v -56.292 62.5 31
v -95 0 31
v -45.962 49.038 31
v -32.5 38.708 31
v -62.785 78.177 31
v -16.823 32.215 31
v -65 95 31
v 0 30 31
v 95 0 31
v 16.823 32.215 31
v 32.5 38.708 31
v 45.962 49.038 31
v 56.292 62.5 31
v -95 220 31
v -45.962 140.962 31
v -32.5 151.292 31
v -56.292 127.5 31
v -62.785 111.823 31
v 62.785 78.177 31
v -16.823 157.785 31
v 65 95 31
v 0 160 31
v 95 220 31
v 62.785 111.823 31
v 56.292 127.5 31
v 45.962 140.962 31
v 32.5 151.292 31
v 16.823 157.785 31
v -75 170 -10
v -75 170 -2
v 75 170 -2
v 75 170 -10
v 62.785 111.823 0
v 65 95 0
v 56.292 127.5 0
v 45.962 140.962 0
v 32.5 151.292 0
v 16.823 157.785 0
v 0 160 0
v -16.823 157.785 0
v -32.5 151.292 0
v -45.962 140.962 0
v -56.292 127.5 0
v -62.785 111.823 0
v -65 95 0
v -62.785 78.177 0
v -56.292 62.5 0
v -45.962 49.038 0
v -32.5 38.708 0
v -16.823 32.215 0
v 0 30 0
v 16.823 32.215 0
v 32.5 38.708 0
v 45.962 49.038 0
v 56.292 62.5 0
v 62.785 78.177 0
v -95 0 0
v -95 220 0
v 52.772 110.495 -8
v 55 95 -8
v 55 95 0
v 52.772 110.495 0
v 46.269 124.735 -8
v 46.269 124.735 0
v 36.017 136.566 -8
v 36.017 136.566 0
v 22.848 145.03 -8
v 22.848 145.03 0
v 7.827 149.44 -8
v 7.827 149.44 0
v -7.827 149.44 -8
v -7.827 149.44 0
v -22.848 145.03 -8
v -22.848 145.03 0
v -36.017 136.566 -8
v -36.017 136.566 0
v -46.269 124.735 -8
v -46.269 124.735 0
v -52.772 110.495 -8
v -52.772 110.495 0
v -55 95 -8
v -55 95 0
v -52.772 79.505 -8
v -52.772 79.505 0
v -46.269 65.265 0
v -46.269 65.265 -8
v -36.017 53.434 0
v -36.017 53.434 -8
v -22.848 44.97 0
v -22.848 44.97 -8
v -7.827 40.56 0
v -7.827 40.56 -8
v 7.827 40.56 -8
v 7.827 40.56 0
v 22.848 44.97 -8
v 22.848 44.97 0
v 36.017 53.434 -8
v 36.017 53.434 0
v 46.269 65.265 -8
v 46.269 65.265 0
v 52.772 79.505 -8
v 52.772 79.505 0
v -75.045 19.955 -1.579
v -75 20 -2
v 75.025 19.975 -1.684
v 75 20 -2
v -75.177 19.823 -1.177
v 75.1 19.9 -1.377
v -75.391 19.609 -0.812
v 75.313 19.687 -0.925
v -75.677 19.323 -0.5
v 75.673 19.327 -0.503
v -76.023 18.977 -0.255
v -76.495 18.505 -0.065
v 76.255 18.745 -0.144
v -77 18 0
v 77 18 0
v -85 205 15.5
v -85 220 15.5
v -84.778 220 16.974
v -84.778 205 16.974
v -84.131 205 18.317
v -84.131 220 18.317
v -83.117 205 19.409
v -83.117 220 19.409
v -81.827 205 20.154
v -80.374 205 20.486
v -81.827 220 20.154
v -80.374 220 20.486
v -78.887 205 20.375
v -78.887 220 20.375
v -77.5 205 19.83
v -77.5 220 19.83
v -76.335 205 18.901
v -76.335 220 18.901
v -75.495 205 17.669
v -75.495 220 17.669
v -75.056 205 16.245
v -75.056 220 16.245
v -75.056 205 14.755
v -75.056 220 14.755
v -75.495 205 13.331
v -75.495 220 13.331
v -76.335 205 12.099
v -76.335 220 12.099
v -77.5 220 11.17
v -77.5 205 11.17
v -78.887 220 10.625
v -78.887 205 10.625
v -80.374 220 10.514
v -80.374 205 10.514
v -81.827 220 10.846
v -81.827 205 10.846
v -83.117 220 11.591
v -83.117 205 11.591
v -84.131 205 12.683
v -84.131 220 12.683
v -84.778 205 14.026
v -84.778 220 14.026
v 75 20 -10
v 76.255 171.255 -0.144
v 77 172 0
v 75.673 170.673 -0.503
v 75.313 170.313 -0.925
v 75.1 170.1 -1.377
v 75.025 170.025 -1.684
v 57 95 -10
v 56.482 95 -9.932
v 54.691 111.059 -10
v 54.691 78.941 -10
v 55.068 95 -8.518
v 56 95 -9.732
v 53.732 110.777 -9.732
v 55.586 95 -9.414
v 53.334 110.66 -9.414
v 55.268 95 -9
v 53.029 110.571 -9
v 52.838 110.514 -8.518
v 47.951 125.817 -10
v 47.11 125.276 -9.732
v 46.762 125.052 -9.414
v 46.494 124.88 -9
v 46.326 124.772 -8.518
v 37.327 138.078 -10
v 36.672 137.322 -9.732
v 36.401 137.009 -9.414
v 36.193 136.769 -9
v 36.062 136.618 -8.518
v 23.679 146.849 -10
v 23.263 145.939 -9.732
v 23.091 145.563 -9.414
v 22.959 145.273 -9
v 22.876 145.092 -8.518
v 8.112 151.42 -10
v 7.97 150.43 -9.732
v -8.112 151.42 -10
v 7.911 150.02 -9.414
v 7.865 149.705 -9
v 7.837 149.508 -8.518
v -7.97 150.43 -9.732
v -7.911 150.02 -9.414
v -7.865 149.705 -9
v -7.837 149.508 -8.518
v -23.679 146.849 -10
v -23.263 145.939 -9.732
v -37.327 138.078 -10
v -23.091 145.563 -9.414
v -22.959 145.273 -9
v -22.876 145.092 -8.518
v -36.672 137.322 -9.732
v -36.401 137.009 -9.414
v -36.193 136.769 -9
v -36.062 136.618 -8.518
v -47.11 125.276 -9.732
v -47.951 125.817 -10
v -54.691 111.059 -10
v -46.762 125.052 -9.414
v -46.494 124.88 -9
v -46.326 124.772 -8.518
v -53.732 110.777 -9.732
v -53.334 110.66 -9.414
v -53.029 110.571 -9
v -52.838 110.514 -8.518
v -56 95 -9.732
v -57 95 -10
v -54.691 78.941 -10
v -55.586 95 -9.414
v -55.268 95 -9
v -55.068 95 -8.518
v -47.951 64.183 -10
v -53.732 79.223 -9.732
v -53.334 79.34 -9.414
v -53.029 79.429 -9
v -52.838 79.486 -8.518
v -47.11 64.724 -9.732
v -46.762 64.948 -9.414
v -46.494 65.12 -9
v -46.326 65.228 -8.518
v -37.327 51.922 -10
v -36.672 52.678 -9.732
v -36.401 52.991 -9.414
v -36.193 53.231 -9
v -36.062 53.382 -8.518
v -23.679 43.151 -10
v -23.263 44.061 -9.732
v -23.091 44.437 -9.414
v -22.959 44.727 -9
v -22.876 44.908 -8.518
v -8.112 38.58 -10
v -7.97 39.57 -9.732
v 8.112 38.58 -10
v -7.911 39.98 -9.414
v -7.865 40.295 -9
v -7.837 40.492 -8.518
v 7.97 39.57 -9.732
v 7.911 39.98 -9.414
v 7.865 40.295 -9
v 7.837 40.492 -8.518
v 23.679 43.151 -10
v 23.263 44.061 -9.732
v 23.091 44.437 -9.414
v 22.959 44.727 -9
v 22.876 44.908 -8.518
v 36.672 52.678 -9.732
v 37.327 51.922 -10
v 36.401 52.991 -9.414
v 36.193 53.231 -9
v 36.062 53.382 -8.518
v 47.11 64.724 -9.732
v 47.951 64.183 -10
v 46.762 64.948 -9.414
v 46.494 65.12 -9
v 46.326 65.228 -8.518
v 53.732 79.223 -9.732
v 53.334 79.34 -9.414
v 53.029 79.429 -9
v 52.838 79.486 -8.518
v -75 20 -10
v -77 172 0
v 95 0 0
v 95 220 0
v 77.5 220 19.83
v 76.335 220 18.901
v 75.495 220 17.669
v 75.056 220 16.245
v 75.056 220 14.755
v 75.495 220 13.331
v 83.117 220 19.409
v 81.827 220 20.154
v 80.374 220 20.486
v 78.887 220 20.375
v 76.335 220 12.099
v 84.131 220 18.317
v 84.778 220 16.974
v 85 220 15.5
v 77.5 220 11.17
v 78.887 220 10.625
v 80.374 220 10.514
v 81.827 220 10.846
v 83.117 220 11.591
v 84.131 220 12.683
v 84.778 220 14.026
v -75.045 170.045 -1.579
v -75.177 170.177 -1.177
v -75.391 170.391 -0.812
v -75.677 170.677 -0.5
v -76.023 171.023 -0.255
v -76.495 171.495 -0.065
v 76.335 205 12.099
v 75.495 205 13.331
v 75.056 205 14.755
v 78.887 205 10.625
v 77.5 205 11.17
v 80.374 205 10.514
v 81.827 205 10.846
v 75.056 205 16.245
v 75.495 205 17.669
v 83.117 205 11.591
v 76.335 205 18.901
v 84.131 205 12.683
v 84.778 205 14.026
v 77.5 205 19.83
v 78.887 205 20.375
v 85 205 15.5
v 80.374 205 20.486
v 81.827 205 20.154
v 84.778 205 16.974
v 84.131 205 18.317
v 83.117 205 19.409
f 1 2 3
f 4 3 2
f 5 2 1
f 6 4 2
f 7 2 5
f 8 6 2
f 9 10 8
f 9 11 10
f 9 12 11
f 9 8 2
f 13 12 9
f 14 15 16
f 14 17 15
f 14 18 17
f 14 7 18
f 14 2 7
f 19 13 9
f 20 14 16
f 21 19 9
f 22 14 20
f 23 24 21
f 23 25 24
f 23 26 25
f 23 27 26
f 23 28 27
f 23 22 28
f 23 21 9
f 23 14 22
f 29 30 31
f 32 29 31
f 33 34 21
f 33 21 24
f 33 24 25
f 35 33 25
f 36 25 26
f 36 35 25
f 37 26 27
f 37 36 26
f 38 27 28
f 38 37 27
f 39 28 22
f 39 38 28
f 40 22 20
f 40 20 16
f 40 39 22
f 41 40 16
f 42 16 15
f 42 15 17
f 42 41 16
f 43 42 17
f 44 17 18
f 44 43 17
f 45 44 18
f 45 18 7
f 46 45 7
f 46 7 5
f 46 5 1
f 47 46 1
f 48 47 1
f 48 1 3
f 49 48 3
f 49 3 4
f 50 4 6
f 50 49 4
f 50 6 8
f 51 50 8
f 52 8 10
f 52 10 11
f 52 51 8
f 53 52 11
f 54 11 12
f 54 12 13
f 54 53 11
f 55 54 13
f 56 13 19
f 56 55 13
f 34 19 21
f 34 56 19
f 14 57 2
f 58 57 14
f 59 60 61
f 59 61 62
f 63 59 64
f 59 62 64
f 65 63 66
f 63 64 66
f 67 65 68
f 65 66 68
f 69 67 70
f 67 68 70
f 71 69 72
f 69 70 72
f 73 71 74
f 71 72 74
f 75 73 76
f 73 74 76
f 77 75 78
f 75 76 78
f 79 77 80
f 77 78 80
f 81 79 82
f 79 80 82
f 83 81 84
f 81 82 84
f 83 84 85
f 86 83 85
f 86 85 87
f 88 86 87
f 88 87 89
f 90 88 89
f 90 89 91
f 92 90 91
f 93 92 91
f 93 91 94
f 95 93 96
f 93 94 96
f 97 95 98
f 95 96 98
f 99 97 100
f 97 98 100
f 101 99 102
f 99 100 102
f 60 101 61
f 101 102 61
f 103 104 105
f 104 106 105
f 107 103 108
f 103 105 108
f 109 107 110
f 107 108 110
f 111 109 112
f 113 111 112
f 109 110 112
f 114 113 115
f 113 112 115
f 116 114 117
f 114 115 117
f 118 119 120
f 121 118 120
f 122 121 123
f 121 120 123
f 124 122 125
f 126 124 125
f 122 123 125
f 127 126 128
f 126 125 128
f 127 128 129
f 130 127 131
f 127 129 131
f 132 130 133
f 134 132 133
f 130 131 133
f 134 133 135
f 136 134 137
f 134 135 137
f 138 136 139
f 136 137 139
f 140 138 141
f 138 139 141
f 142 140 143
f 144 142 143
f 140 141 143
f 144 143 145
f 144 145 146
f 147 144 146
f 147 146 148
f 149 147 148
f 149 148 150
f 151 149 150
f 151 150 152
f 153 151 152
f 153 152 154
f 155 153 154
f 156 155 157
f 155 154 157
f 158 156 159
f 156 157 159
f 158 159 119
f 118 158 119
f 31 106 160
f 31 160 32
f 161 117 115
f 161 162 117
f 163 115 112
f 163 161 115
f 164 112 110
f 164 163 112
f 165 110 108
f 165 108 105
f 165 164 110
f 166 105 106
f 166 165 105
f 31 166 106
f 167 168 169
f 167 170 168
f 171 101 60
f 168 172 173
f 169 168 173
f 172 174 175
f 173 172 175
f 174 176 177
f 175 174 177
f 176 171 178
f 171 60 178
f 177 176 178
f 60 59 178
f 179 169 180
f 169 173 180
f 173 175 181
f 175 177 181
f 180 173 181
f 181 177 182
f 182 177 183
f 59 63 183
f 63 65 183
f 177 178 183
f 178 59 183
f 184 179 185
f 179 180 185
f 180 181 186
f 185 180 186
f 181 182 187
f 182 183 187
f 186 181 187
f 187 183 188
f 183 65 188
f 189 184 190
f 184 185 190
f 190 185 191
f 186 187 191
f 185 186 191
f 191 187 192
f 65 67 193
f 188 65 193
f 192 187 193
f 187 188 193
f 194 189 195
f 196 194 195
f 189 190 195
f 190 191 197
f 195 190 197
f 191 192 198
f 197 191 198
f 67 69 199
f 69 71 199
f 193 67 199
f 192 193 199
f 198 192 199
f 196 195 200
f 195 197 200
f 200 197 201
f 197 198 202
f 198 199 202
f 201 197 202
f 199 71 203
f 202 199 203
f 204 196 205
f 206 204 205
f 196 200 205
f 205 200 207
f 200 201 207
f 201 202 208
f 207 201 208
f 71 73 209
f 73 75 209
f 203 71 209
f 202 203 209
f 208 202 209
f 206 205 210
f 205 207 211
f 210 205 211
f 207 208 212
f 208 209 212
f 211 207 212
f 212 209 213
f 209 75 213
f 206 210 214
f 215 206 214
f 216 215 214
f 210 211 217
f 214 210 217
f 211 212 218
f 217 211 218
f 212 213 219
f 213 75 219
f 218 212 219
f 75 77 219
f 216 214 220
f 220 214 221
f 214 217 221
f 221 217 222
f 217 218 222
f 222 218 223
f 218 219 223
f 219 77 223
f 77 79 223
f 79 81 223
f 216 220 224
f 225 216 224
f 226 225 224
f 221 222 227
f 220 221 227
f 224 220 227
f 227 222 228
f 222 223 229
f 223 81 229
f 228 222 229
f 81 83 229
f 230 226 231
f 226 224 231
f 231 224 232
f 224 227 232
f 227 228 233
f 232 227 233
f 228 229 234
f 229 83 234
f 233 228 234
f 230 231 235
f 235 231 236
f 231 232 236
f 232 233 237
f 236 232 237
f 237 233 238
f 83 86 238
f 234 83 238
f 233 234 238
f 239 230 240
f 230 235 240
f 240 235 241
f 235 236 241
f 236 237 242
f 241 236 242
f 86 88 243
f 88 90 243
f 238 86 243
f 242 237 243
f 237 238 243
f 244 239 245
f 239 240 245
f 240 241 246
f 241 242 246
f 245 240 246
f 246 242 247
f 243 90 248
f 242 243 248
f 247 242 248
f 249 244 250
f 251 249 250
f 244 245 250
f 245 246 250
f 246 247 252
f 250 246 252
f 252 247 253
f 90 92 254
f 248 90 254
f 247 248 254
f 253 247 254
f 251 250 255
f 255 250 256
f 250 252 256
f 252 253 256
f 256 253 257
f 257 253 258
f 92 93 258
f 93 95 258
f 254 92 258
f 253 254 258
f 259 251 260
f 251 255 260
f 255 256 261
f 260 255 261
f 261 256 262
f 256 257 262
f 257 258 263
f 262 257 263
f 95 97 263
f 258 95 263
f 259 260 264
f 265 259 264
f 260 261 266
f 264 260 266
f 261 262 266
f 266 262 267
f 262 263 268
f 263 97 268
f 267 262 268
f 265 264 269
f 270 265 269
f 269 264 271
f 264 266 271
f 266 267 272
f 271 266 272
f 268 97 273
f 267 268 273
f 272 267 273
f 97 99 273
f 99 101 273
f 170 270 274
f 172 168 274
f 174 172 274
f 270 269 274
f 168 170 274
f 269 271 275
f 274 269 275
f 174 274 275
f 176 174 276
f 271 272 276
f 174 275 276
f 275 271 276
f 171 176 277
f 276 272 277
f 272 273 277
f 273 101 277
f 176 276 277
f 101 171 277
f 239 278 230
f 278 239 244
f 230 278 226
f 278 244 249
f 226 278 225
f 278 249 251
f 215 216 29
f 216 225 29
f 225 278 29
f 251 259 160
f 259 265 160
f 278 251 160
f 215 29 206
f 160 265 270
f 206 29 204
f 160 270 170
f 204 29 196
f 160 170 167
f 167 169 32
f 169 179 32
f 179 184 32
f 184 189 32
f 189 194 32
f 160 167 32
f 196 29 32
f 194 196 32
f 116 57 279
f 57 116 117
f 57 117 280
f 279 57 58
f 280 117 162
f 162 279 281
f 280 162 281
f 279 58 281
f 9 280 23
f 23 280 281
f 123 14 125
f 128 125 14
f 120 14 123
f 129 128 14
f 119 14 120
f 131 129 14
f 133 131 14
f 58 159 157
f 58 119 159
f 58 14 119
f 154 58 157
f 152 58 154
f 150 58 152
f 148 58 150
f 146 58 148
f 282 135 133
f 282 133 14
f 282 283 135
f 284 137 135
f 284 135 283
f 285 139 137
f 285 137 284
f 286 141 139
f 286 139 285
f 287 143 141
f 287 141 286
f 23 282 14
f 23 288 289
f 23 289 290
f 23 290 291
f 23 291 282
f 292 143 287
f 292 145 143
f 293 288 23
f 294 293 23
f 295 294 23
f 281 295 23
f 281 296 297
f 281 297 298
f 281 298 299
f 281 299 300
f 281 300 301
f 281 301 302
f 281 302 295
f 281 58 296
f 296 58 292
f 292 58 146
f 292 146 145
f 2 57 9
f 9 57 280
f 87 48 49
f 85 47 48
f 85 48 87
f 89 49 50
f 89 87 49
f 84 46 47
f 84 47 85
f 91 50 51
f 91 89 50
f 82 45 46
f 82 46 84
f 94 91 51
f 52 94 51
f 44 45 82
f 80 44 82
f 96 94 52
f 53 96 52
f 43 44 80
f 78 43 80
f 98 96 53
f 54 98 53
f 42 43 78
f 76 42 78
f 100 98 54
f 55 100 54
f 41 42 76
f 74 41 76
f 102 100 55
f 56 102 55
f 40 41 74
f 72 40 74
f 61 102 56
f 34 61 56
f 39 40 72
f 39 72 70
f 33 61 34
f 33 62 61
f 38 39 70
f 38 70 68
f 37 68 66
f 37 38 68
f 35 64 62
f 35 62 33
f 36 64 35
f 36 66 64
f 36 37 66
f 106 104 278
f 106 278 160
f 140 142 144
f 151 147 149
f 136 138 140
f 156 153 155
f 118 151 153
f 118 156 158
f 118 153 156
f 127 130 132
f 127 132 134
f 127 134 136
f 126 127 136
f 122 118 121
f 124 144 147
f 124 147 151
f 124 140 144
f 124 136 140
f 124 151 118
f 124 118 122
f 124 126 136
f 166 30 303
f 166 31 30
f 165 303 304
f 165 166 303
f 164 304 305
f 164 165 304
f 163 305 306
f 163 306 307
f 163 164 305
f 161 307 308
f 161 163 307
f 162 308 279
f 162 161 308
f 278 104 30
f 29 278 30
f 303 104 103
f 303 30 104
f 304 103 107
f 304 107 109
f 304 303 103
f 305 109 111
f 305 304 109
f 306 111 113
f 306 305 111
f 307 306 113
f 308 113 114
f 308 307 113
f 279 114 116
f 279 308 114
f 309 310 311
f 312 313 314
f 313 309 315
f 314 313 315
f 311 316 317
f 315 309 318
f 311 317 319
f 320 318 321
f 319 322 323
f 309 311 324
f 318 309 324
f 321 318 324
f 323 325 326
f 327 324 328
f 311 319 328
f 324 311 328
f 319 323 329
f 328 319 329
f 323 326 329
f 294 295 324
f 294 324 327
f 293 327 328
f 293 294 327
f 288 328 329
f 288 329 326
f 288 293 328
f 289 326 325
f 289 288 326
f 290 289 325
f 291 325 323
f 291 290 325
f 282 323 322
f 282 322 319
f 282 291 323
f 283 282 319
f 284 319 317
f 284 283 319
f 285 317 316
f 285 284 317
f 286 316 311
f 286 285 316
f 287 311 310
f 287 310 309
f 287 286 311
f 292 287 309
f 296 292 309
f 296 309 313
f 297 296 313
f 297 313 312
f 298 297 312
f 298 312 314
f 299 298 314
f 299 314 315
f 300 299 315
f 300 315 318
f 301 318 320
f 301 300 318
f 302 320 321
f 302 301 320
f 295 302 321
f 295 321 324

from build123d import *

# Parameters (mm, degrees)
ESQUISSE1_W             = 190
ESQUISSE1_H             = 220
ESQUISSE1_R             = 65
BOSS_EXTRU_1_DEPTH      = 31
ESQUISSE2_R             = 5
ENL_V_MAT_EXTRU_1_DEPTH = 15
ESQUISSE4_W             = 150
ESQUISSE4_H             = 150
ESQUISSE4_R             = 55
BOSS_EXTRU_2_DEPTH      = 10
CONG_1_R                = 2


with BuildPart() as part:
    # Esquisse1 → Boss.-Extru.1 (new body)
    with BuildSketch(Plane.XY):
        with Locations((0, 110)):
            Rectangle(ESQUISSE1_W, ESQUISSE1_H)
        with Locations((0, 95)):
            Circle(ESQUISSE1_R, mode=Mode.SUBTRACT)
    extrude(amount=BOSS_EXTRU_1_DEPTH)

    # Esquisse2 → Enlèv. mat.-Extru.1 (cut)
    with BuildSketch(Plane(origin=(0, 220, 0), x_dir=(1, 0, 0), z_dir=(0, 1, 0))):
        with Locations(Location((-80, -15.5, 0), (0, 0, 180))):
            Circle(ESQUISSE2_R)
    enl_v_mat_extru_1 = extrude(amount=-ENL_V_MAT_EXTRU_1_DEPTH, mode=Mode.SUBTRACT)

    # Symétrie1: Enlèv. mat.-Extru.1 across plane
    add(enl_v_mat_extru_1.mirror(Plane(origin=(0, 0, 0), x_dir=(0, 0, 1), z_dir=(1, 0, 0))), mode=Mode.SUBTRACT)

    # Esquisse4 → Boss.-Extru.2 (add)
    with BuildSketch(Plane.XY):
        with Locations((0, 95)):
            Rectangle(ESQUISSE4_W, ESQUISSE4_H)
        with Locations((0, 95)):
            Circle(ESQUISSE4_R, mode=Mode.SUBTRACT)
    extrude(amount=-BOSS_EXTRU_2_DEPTH)

    # Congé1
    cong_1_edges = [part.edges().sort_by_distance(p)[0] for p in [
        (-55, 95, -10),
        (75, 95, 0),
        (0, 170, 0),
        (-75, 95, 0),
        (0, 20, 0),
    ]]
    fillet(cong_1_edges, radius=CONG_1_R)


solid = part.part
